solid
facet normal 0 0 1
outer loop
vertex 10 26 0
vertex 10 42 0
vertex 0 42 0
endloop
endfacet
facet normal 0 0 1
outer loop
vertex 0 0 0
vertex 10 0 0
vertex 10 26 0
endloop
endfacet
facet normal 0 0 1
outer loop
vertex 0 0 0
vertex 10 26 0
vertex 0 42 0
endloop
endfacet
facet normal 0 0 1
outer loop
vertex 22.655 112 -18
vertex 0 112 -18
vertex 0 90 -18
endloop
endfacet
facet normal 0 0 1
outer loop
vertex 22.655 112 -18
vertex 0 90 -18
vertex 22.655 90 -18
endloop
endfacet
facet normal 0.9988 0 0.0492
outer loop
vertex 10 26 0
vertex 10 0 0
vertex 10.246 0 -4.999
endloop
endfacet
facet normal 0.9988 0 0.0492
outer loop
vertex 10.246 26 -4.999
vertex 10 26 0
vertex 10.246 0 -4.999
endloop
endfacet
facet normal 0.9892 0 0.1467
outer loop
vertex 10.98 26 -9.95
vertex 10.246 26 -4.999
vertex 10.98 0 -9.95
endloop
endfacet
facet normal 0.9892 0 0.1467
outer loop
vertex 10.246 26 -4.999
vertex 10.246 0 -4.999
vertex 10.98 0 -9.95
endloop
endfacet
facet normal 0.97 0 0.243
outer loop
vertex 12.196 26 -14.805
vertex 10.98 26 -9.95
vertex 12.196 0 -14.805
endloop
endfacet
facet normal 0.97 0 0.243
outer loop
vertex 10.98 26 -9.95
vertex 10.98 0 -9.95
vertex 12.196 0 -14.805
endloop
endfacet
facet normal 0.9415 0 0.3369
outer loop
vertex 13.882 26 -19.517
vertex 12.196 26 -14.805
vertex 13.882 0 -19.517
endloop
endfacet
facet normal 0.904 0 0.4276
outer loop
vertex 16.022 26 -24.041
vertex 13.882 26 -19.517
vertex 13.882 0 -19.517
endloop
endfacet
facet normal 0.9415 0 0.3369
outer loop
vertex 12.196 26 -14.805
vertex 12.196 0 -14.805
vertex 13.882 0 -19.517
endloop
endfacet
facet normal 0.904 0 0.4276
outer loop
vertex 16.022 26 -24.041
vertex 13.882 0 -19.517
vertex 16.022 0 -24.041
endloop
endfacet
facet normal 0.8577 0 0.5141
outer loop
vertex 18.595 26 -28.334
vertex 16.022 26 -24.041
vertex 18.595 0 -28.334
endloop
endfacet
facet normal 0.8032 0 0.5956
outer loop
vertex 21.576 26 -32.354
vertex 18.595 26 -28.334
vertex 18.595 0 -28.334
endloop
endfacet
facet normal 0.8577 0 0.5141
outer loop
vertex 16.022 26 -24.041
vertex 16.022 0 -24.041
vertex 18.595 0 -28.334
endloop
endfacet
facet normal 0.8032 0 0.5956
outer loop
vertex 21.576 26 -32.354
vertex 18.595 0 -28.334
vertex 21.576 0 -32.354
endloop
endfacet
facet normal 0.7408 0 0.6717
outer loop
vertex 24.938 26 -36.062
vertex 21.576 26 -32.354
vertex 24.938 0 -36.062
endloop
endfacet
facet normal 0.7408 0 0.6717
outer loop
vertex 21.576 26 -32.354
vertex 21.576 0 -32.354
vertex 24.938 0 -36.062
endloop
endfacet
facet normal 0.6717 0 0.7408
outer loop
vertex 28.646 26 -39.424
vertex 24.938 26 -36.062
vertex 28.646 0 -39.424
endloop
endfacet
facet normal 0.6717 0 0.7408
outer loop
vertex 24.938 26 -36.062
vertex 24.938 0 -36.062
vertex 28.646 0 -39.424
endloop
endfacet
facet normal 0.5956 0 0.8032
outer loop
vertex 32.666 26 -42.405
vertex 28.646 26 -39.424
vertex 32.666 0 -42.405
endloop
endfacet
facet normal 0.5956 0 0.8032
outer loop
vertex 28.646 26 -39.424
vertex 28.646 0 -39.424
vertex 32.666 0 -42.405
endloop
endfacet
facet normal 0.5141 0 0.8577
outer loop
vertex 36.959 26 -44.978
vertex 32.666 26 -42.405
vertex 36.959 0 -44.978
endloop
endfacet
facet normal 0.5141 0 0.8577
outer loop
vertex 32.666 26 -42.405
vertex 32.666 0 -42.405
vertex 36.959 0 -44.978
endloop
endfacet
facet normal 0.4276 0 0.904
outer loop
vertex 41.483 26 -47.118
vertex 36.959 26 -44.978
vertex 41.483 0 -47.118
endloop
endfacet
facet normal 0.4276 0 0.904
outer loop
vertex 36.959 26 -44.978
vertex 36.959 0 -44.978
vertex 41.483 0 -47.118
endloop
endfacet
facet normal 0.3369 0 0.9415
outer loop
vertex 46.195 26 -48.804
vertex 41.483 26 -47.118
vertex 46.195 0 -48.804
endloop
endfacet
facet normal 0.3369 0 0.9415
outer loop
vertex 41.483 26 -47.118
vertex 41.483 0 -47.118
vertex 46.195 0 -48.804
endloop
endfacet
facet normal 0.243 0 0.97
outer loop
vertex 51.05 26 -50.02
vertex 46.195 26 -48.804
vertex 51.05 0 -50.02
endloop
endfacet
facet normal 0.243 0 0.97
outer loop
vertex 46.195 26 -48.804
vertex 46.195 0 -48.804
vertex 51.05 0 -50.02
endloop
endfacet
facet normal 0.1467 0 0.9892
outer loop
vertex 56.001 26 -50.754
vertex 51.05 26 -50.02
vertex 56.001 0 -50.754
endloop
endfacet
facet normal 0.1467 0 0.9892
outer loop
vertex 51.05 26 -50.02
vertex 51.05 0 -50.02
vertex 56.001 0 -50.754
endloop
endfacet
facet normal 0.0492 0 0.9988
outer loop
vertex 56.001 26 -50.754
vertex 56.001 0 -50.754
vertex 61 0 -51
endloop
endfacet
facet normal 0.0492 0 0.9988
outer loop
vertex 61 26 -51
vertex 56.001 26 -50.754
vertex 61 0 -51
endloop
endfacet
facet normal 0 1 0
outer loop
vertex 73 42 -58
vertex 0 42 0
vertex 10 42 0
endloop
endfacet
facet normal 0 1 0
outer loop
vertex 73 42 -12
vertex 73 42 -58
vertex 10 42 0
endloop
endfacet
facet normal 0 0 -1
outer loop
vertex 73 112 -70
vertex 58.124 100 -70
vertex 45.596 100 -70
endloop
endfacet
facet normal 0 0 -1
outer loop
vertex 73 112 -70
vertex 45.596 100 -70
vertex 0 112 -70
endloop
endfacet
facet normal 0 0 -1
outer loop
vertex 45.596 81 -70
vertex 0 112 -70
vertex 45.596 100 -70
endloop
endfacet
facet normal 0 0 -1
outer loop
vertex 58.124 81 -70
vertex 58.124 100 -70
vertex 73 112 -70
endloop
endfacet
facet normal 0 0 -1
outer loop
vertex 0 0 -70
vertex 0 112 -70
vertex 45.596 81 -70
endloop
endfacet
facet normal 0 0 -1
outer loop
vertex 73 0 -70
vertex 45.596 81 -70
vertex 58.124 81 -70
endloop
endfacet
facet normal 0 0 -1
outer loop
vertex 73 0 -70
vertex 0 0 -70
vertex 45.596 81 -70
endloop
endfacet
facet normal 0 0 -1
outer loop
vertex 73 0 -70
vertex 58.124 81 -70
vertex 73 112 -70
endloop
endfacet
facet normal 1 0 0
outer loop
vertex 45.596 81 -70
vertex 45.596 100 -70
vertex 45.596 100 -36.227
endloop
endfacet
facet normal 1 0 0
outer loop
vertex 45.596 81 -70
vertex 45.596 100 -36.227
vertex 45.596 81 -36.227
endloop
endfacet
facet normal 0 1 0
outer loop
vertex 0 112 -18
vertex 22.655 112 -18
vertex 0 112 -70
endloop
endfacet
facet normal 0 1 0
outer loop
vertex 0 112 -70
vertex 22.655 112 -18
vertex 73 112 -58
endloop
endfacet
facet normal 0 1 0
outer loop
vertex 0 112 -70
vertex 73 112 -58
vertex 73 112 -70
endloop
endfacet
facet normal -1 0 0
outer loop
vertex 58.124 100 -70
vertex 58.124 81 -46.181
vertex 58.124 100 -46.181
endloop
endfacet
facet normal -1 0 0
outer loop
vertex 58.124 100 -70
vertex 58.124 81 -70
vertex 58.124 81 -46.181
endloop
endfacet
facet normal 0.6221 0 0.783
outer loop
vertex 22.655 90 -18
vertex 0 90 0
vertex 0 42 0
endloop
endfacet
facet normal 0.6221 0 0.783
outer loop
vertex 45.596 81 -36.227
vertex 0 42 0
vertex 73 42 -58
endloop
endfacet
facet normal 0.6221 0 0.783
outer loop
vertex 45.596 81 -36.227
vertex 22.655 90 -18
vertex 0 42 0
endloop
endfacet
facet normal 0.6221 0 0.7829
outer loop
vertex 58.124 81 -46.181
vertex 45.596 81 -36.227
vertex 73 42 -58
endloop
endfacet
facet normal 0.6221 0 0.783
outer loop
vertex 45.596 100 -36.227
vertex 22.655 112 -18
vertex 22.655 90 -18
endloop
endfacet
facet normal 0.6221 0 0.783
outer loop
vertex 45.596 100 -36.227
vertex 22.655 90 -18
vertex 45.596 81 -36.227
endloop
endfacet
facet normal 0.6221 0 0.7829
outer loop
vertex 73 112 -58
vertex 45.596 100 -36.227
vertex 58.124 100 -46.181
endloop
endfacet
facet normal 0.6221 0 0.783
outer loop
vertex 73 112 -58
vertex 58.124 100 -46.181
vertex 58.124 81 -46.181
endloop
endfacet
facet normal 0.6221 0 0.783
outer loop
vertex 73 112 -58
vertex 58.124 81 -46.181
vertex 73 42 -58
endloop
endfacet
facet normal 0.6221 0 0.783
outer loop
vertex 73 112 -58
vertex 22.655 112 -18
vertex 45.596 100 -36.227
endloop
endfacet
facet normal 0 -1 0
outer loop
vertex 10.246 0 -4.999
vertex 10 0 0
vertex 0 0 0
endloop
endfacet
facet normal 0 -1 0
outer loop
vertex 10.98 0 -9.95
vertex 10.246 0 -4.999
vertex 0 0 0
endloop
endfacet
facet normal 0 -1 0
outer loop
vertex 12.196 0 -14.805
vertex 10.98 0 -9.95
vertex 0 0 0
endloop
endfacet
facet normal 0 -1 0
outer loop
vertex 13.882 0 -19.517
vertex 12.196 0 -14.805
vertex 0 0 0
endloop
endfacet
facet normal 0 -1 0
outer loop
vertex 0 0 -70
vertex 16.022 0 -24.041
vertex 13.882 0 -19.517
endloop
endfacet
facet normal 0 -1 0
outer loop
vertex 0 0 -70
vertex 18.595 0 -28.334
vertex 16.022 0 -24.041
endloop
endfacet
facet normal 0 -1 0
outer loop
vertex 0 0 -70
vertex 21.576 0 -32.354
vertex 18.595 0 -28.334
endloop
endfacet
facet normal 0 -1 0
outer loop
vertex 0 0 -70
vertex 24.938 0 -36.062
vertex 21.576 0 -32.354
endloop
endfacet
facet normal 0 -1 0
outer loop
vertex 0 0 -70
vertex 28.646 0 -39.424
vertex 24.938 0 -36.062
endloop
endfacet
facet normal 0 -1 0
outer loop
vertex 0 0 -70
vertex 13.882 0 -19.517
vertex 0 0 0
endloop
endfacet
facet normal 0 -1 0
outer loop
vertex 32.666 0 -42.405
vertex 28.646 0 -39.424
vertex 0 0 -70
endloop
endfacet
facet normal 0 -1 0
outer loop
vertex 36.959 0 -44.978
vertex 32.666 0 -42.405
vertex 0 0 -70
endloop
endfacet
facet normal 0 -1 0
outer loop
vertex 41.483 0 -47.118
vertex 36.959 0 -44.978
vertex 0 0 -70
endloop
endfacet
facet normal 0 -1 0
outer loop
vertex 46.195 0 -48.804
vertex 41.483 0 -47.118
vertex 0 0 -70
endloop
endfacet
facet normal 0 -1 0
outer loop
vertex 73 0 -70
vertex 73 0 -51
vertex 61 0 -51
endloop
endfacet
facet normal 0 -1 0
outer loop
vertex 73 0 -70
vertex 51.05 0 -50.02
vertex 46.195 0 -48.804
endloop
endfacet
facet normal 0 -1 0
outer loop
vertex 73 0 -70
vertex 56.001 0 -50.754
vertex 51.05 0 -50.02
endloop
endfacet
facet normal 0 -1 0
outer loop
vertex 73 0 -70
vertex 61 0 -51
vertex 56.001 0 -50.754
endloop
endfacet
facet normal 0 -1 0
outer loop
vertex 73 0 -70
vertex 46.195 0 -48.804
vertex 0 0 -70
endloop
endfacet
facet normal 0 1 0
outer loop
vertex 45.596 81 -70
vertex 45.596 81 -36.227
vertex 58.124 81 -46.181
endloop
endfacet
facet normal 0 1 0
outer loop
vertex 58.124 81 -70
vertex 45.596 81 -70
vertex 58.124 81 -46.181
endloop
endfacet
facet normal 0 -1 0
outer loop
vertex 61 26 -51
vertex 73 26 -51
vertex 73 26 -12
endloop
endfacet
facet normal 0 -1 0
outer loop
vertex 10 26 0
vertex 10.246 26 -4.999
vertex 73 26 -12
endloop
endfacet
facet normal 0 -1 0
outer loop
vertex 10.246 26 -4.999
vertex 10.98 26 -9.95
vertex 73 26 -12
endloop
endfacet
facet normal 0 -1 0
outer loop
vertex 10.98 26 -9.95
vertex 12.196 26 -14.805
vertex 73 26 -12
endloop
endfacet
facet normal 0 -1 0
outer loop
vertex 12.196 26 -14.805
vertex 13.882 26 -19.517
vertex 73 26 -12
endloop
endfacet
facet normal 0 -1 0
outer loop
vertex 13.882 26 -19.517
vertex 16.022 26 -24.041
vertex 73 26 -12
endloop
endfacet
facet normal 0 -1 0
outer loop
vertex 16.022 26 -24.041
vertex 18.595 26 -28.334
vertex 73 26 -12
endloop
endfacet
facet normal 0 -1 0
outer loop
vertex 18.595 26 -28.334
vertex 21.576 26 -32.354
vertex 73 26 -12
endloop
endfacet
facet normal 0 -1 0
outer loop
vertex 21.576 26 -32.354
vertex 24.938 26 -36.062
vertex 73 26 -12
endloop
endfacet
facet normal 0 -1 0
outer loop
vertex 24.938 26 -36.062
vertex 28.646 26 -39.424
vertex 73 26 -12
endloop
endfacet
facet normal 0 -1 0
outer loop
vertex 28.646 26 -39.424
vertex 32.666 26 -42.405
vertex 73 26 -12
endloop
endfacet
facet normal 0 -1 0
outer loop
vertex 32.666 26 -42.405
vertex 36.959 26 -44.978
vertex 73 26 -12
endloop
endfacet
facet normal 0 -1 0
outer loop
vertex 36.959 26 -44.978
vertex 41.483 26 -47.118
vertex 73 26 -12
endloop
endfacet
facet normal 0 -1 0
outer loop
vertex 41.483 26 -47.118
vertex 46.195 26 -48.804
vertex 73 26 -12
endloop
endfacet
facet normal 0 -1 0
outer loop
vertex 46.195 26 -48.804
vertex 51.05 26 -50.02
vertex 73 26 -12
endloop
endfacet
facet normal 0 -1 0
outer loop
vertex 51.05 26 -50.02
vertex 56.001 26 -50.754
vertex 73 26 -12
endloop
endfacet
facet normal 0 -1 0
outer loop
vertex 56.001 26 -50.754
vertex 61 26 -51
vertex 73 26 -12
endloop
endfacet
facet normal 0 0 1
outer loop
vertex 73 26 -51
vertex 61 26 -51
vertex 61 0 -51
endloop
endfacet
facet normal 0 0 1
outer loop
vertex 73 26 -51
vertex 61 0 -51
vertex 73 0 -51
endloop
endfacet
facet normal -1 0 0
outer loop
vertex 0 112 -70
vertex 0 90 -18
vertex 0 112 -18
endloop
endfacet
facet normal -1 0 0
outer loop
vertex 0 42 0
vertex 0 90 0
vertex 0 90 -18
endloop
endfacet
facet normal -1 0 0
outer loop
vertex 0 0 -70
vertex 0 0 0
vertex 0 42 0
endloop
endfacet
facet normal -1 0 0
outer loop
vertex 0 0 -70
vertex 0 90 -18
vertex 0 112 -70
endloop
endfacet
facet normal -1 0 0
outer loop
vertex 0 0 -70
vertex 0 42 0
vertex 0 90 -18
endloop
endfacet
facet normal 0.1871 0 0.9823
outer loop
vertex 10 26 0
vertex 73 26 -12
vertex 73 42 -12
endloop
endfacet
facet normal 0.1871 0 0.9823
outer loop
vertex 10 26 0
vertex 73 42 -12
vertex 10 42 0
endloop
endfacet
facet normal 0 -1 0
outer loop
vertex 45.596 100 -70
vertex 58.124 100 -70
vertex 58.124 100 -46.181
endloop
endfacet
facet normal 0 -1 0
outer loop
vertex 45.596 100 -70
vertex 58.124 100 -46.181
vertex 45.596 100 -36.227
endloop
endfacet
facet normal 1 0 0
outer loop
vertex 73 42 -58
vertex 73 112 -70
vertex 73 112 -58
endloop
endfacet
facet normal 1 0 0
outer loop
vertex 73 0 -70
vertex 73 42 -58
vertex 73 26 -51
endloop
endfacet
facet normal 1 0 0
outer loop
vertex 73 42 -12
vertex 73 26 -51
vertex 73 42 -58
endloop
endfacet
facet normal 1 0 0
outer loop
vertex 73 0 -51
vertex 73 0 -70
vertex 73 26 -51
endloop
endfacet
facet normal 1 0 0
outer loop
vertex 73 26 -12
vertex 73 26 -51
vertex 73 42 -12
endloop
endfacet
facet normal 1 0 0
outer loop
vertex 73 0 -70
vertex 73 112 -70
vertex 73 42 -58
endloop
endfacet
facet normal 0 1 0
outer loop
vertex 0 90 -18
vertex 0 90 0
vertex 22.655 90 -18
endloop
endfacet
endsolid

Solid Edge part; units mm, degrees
sketch "Sketch1" plane through (0, 0, 0) normal (0, -1, 0) x (1, 0, 0)
  line L0 (73, 0) -> (0, 0)
  line L1 (0, 0) -> (0, -70)
  line L2 (0, -70) -> (73, -70)
  line L3 (73, -70) -> (73, 0)
extrude "Protrusion1" add sketch "Sketch1" against normal blind 112
sketch "Sketch2" plane through (36.5, 0, -35) normal (0, -1, 0) x (1, 0, 0)
  line L0 (-26.5, 35) -> (36.5, 35)
  line L1 (36.5, 35) -> (36.5, -16)
  line L2 (24.5, -16) -> (36.5, -16)
  arc A0 (-26.5, 35) -> (24.5, -16) centre (24.5, 35) ccw
extrude "ExtrudedCutout_1" cut sketch "Sketch2" against normal blind 26
sketch "Sketch3" plane through (41.5, 26, -25.5) normal (0, -1, 0) x (1, 0, 0)
  line L0 (31.5, 25.5) -> (-31.5, 25.5)
  line L1 (31.5, 13.5) -> (-31.5, 25.5)
  line L2 (31.5, 25.5) -> (31.5, 13.5)
extrude "ExtrudedCutout_2" cut sketch "Sketch3" against normal blind 16
sketch "Sketch4" plane through (36.5, 112, -35) normal (0, 1, 0) x (-1, 0, 0)
  line L0 (-36.5, 35) -> (-36.5, -23)
  line L1 (36.5, 35) -> (-36.5, -23)
  line L2 (36.5, 35) -> (-36.5, 35)
extrude "ExtrudedCutout_3" cut sketch "Sketch4" against normal blind 70
sketch "Sketch5" plane through (36.5, 112, -35) normal (0, 1, 0) x (-1, 0, 0)
  line L0 (13.8448, 17) -> (36.5, 35)
  line L1 (36.5, 35) -> (36.5, 17)
  line L2 (36.5, 17) -> (13.8448, 17)
extrude "ExtrudedCutout_4" cut sketch "Sketch5" against normal blind 22
sketch "Sketch6" plane through (36.5, 56, -70) normal (0, 0, -1) x (0, -1, 0)
  line L0 (-25, -21.6238) -> (-44, -21.6238)
  line L1 (-44, -21.6238) -> (-44, -9.0965)
  line L2 (-44, -9.0965) -> (-25, -9.0965)
  line L3 (-25, -9.0965) -> (-25, -21.6238)
extrude "ExtrudedCutout_6" cut sketch "Sketch6" against normal blind 64.3754
